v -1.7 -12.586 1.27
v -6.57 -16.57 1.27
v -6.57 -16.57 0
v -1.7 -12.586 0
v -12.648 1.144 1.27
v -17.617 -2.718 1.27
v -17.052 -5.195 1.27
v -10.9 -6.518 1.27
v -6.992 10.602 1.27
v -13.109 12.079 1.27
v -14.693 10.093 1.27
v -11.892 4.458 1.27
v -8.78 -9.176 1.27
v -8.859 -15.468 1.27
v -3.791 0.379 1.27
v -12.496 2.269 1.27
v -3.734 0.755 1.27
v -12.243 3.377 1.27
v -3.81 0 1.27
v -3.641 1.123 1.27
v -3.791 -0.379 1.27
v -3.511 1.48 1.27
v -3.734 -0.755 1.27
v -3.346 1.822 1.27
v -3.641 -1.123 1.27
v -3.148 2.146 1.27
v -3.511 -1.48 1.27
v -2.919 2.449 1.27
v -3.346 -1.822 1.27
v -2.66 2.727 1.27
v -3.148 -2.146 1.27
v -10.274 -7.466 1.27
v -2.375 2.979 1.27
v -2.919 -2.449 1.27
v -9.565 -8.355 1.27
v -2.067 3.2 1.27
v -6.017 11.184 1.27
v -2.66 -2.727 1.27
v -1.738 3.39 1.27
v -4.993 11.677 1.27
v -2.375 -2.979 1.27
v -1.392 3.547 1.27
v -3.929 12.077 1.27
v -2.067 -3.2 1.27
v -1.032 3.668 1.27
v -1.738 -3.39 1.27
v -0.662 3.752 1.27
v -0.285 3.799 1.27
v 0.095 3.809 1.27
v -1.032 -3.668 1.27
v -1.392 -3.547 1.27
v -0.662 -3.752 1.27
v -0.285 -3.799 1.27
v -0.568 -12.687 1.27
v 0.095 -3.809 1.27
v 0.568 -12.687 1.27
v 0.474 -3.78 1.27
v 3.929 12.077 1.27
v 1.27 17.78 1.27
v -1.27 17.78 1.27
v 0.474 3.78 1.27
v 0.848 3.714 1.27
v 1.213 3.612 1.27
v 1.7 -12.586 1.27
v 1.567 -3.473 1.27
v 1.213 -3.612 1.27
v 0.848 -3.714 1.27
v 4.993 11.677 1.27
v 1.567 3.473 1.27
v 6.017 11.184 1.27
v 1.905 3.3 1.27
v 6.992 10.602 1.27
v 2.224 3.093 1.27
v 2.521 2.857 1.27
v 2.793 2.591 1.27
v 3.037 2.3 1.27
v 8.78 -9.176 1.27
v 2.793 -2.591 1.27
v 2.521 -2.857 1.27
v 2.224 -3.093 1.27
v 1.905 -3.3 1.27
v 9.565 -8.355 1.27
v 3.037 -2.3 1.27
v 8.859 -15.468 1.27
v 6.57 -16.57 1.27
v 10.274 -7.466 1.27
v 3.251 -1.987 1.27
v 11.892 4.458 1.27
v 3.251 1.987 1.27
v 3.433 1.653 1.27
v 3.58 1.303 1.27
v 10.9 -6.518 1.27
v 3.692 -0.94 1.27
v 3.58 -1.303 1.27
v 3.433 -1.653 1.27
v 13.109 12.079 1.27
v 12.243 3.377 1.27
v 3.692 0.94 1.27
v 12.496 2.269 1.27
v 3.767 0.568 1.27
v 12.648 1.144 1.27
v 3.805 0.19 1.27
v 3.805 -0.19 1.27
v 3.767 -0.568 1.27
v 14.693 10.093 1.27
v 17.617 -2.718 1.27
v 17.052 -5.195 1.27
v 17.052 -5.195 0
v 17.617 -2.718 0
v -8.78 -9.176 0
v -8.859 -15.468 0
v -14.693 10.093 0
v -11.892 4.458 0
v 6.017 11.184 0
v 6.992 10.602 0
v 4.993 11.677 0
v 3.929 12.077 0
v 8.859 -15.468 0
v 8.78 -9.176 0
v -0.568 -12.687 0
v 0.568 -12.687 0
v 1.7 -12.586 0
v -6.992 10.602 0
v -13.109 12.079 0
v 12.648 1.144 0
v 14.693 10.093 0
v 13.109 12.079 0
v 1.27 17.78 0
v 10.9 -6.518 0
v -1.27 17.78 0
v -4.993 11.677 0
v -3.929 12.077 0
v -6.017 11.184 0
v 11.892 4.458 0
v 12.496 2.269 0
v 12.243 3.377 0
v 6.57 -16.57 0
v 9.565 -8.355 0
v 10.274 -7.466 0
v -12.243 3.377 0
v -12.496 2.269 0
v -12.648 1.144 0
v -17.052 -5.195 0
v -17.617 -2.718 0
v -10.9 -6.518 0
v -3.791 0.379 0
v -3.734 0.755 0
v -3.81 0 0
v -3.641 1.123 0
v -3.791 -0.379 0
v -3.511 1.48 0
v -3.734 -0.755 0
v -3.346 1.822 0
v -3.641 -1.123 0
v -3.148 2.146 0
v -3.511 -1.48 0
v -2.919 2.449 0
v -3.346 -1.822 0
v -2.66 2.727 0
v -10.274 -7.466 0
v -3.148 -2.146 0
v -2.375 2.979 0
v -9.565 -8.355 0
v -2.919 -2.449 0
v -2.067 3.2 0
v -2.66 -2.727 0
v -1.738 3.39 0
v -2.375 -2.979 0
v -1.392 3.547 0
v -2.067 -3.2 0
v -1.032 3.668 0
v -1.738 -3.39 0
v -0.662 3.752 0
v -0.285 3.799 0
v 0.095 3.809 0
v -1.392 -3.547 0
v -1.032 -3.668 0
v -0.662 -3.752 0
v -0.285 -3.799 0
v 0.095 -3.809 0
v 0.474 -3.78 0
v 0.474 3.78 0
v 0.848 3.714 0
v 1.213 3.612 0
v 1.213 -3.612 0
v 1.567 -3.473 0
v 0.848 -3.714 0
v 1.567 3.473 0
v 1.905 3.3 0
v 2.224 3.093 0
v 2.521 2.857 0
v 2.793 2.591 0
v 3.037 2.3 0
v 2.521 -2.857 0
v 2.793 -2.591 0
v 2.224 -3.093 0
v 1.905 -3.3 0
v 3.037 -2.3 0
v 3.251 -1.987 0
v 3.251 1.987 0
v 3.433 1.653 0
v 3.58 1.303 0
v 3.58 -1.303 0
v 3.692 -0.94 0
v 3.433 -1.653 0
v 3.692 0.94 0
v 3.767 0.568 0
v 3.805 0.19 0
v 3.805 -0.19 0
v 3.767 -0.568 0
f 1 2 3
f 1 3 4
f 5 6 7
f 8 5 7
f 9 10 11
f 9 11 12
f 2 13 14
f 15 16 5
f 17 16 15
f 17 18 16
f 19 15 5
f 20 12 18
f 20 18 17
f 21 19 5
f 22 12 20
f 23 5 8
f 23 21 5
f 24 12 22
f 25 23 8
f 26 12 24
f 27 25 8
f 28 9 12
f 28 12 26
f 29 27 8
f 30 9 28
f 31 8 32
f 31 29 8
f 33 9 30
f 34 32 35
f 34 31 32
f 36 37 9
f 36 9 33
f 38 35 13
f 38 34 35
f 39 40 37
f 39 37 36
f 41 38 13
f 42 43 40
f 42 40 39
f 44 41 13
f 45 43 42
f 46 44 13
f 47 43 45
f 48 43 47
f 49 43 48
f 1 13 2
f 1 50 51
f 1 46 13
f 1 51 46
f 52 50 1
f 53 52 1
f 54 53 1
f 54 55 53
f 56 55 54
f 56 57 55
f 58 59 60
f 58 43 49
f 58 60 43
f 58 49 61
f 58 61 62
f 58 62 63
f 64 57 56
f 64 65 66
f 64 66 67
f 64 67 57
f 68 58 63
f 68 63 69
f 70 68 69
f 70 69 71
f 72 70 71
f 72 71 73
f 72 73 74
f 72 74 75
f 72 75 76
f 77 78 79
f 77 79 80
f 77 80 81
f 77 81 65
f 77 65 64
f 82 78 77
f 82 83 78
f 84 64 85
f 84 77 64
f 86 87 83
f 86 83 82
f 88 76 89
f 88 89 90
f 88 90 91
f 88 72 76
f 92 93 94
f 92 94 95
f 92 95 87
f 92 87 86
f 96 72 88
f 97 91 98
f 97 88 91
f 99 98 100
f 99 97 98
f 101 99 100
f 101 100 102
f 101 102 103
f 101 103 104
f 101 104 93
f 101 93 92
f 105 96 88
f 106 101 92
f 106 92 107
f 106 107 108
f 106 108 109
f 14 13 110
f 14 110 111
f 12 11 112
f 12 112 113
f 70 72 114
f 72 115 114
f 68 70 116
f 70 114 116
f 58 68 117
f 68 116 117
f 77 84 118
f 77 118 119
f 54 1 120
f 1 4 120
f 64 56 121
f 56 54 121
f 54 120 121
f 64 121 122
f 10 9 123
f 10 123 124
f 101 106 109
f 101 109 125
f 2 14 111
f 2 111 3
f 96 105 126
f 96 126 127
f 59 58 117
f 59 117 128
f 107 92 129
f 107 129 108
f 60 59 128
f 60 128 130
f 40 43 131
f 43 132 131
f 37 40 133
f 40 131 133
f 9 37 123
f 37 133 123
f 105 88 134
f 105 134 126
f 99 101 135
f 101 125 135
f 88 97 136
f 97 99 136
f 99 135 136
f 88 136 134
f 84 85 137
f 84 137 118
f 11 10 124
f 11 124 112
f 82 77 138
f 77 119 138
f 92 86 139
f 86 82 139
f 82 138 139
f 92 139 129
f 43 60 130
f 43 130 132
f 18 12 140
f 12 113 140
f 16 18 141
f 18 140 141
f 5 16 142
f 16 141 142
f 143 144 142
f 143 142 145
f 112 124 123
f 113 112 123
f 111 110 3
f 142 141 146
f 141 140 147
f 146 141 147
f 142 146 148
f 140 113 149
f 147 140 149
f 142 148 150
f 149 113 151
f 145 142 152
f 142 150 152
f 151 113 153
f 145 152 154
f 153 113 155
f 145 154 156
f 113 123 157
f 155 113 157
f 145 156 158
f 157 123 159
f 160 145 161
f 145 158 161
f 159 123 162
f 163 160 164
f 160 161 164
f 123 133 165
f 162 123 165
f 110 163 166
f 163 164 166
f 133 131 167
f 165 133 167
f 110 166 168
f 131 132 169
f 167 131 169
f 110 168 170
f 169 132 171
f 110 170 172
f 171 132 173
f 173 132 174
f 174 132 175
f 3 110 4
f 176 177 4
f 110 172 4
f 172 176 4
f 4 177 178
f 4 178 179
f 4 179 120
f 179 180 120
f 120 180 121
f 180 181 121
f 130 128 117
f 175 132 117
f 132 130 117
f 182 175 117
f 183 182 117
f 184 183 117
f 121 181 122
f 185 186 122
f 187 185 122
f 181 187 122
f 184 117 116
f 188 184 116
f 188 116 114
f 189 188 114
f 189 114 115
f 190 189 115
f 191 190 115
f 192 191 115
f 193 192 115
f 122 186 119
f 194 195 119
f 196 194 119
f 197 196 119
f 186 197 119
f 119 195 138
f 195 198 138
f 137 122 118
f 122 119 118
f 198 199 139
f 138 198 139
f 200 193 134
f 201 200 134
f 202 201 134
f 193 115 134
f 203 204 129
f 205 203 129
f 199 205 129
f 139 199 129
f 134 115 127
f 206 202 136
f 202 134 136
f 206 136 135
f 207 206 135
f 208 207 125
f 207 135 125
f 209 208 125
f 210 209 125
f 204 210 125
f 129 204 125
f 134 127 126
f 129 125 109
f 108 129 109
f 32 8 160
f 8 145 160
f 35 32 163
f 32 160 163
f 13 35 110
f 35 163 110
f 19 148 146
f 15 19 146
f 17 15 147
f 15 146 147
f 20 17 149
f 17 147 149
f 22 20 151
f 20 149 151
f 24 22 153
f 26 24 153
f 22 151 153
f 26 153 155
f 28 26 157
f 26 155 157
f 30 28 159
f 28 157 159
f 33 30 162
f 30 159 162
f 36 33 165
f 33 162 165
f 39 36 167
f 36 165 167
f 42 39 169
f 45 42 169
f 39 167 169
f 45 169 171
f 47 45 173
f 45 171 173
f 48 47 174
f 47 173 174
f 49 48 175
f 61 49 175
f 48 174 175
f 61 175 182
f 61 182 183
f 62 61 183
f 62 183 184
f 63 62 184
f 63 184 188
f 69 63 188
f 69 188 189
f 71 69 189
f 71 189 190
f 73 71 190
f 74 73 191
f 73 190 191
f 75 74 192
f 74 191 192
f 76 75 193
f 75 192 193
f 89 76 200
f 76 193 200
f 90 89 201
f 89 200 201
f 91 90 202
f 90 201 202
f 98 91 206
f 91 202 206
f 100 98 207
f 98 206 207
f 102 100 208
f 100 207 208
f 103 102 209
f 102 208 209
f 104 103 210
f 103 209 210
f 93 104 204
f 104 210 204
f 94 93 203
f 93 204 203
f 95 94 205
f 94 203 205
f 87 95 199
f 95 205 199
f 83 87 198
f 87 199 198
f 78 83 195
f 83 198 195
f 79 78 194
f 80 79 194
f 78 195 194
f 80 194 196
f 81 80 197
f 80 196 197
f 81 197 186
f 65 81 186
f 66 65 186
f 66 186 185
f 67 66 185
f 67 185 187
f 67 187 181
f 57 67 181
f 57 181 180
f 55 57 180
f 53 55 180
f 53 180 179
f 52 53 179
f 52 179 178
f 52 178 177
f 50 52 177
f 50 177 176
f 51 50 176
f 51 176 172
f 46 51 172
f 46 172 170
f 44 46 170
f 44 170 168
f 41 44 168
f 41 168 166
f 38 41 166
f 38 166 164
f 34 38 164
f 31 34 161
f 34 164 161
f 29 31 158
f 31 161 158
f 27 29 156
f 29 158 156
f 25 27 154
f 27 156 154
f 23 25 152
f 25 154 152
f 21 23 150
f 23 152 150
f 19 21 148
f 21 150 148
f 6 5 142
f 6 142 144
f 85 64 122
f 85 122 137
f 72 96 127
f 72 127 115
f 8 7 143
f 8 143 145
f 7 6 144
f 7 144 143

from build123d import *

# Parameters (mm, degrees)
SKETCH1_R           = 12.7
BOSS_EXTRUDE1_DEPTH = 1.27
BOSS_EXTRUDE2_DEPTH = 1.27
CIRPATTERN1_COUNT   = 7
SKETCH4_R           = 3.81
CUT_EXTRUDE1_DEPTH  = 1.27


with BuildPart() as part:
    # Sketch1 → Boss-Extrude1 (new body)
    with BuildSketch(Plane.XY):
        Circle(SKETCH1_R)
    extrude(amount=BOSS_EXTRUDE1_DEPTH)

    # Sketch3 → Boss-Extrude2 (add)
    with BuildSketch(Plane.XY.offset(1.27)):
        Polygon((0, 17.78), (-1.27, 17.78), (-3.929437707, 12.076817433), (3.929437707, 12.076817433), (1.27, 17.78), align=None)
    boss_extrude2 = extrude(amount=-BOSS_EXTRUDE2_DEPTH)

    # CirPattern1: Boss-Extrude2 ×7 about axis
    cirpattern1_axis = Axis((0, 0, 0), (0, 0, 1))
    for i in range(1, CIRPATTERN1_COUNT):
        add(boss_extrude2.rotate(cirpattern1_axis, i * 360 / CIRPATTERN1_COUNT))

    # Sketch4 → Cut-Extrude1 (cut)
    with BuildSketch(Plane(origin=(0, 0, 0), x_dir=(-1, 0, 0), z_dir=(0, 0, -1))):
        Circle(SKETCH4_R)
    extrude(amount=-CUT_EXTRUDE1_DEPTH, mode=Mode.SUBTRACT)


solid = part.part
